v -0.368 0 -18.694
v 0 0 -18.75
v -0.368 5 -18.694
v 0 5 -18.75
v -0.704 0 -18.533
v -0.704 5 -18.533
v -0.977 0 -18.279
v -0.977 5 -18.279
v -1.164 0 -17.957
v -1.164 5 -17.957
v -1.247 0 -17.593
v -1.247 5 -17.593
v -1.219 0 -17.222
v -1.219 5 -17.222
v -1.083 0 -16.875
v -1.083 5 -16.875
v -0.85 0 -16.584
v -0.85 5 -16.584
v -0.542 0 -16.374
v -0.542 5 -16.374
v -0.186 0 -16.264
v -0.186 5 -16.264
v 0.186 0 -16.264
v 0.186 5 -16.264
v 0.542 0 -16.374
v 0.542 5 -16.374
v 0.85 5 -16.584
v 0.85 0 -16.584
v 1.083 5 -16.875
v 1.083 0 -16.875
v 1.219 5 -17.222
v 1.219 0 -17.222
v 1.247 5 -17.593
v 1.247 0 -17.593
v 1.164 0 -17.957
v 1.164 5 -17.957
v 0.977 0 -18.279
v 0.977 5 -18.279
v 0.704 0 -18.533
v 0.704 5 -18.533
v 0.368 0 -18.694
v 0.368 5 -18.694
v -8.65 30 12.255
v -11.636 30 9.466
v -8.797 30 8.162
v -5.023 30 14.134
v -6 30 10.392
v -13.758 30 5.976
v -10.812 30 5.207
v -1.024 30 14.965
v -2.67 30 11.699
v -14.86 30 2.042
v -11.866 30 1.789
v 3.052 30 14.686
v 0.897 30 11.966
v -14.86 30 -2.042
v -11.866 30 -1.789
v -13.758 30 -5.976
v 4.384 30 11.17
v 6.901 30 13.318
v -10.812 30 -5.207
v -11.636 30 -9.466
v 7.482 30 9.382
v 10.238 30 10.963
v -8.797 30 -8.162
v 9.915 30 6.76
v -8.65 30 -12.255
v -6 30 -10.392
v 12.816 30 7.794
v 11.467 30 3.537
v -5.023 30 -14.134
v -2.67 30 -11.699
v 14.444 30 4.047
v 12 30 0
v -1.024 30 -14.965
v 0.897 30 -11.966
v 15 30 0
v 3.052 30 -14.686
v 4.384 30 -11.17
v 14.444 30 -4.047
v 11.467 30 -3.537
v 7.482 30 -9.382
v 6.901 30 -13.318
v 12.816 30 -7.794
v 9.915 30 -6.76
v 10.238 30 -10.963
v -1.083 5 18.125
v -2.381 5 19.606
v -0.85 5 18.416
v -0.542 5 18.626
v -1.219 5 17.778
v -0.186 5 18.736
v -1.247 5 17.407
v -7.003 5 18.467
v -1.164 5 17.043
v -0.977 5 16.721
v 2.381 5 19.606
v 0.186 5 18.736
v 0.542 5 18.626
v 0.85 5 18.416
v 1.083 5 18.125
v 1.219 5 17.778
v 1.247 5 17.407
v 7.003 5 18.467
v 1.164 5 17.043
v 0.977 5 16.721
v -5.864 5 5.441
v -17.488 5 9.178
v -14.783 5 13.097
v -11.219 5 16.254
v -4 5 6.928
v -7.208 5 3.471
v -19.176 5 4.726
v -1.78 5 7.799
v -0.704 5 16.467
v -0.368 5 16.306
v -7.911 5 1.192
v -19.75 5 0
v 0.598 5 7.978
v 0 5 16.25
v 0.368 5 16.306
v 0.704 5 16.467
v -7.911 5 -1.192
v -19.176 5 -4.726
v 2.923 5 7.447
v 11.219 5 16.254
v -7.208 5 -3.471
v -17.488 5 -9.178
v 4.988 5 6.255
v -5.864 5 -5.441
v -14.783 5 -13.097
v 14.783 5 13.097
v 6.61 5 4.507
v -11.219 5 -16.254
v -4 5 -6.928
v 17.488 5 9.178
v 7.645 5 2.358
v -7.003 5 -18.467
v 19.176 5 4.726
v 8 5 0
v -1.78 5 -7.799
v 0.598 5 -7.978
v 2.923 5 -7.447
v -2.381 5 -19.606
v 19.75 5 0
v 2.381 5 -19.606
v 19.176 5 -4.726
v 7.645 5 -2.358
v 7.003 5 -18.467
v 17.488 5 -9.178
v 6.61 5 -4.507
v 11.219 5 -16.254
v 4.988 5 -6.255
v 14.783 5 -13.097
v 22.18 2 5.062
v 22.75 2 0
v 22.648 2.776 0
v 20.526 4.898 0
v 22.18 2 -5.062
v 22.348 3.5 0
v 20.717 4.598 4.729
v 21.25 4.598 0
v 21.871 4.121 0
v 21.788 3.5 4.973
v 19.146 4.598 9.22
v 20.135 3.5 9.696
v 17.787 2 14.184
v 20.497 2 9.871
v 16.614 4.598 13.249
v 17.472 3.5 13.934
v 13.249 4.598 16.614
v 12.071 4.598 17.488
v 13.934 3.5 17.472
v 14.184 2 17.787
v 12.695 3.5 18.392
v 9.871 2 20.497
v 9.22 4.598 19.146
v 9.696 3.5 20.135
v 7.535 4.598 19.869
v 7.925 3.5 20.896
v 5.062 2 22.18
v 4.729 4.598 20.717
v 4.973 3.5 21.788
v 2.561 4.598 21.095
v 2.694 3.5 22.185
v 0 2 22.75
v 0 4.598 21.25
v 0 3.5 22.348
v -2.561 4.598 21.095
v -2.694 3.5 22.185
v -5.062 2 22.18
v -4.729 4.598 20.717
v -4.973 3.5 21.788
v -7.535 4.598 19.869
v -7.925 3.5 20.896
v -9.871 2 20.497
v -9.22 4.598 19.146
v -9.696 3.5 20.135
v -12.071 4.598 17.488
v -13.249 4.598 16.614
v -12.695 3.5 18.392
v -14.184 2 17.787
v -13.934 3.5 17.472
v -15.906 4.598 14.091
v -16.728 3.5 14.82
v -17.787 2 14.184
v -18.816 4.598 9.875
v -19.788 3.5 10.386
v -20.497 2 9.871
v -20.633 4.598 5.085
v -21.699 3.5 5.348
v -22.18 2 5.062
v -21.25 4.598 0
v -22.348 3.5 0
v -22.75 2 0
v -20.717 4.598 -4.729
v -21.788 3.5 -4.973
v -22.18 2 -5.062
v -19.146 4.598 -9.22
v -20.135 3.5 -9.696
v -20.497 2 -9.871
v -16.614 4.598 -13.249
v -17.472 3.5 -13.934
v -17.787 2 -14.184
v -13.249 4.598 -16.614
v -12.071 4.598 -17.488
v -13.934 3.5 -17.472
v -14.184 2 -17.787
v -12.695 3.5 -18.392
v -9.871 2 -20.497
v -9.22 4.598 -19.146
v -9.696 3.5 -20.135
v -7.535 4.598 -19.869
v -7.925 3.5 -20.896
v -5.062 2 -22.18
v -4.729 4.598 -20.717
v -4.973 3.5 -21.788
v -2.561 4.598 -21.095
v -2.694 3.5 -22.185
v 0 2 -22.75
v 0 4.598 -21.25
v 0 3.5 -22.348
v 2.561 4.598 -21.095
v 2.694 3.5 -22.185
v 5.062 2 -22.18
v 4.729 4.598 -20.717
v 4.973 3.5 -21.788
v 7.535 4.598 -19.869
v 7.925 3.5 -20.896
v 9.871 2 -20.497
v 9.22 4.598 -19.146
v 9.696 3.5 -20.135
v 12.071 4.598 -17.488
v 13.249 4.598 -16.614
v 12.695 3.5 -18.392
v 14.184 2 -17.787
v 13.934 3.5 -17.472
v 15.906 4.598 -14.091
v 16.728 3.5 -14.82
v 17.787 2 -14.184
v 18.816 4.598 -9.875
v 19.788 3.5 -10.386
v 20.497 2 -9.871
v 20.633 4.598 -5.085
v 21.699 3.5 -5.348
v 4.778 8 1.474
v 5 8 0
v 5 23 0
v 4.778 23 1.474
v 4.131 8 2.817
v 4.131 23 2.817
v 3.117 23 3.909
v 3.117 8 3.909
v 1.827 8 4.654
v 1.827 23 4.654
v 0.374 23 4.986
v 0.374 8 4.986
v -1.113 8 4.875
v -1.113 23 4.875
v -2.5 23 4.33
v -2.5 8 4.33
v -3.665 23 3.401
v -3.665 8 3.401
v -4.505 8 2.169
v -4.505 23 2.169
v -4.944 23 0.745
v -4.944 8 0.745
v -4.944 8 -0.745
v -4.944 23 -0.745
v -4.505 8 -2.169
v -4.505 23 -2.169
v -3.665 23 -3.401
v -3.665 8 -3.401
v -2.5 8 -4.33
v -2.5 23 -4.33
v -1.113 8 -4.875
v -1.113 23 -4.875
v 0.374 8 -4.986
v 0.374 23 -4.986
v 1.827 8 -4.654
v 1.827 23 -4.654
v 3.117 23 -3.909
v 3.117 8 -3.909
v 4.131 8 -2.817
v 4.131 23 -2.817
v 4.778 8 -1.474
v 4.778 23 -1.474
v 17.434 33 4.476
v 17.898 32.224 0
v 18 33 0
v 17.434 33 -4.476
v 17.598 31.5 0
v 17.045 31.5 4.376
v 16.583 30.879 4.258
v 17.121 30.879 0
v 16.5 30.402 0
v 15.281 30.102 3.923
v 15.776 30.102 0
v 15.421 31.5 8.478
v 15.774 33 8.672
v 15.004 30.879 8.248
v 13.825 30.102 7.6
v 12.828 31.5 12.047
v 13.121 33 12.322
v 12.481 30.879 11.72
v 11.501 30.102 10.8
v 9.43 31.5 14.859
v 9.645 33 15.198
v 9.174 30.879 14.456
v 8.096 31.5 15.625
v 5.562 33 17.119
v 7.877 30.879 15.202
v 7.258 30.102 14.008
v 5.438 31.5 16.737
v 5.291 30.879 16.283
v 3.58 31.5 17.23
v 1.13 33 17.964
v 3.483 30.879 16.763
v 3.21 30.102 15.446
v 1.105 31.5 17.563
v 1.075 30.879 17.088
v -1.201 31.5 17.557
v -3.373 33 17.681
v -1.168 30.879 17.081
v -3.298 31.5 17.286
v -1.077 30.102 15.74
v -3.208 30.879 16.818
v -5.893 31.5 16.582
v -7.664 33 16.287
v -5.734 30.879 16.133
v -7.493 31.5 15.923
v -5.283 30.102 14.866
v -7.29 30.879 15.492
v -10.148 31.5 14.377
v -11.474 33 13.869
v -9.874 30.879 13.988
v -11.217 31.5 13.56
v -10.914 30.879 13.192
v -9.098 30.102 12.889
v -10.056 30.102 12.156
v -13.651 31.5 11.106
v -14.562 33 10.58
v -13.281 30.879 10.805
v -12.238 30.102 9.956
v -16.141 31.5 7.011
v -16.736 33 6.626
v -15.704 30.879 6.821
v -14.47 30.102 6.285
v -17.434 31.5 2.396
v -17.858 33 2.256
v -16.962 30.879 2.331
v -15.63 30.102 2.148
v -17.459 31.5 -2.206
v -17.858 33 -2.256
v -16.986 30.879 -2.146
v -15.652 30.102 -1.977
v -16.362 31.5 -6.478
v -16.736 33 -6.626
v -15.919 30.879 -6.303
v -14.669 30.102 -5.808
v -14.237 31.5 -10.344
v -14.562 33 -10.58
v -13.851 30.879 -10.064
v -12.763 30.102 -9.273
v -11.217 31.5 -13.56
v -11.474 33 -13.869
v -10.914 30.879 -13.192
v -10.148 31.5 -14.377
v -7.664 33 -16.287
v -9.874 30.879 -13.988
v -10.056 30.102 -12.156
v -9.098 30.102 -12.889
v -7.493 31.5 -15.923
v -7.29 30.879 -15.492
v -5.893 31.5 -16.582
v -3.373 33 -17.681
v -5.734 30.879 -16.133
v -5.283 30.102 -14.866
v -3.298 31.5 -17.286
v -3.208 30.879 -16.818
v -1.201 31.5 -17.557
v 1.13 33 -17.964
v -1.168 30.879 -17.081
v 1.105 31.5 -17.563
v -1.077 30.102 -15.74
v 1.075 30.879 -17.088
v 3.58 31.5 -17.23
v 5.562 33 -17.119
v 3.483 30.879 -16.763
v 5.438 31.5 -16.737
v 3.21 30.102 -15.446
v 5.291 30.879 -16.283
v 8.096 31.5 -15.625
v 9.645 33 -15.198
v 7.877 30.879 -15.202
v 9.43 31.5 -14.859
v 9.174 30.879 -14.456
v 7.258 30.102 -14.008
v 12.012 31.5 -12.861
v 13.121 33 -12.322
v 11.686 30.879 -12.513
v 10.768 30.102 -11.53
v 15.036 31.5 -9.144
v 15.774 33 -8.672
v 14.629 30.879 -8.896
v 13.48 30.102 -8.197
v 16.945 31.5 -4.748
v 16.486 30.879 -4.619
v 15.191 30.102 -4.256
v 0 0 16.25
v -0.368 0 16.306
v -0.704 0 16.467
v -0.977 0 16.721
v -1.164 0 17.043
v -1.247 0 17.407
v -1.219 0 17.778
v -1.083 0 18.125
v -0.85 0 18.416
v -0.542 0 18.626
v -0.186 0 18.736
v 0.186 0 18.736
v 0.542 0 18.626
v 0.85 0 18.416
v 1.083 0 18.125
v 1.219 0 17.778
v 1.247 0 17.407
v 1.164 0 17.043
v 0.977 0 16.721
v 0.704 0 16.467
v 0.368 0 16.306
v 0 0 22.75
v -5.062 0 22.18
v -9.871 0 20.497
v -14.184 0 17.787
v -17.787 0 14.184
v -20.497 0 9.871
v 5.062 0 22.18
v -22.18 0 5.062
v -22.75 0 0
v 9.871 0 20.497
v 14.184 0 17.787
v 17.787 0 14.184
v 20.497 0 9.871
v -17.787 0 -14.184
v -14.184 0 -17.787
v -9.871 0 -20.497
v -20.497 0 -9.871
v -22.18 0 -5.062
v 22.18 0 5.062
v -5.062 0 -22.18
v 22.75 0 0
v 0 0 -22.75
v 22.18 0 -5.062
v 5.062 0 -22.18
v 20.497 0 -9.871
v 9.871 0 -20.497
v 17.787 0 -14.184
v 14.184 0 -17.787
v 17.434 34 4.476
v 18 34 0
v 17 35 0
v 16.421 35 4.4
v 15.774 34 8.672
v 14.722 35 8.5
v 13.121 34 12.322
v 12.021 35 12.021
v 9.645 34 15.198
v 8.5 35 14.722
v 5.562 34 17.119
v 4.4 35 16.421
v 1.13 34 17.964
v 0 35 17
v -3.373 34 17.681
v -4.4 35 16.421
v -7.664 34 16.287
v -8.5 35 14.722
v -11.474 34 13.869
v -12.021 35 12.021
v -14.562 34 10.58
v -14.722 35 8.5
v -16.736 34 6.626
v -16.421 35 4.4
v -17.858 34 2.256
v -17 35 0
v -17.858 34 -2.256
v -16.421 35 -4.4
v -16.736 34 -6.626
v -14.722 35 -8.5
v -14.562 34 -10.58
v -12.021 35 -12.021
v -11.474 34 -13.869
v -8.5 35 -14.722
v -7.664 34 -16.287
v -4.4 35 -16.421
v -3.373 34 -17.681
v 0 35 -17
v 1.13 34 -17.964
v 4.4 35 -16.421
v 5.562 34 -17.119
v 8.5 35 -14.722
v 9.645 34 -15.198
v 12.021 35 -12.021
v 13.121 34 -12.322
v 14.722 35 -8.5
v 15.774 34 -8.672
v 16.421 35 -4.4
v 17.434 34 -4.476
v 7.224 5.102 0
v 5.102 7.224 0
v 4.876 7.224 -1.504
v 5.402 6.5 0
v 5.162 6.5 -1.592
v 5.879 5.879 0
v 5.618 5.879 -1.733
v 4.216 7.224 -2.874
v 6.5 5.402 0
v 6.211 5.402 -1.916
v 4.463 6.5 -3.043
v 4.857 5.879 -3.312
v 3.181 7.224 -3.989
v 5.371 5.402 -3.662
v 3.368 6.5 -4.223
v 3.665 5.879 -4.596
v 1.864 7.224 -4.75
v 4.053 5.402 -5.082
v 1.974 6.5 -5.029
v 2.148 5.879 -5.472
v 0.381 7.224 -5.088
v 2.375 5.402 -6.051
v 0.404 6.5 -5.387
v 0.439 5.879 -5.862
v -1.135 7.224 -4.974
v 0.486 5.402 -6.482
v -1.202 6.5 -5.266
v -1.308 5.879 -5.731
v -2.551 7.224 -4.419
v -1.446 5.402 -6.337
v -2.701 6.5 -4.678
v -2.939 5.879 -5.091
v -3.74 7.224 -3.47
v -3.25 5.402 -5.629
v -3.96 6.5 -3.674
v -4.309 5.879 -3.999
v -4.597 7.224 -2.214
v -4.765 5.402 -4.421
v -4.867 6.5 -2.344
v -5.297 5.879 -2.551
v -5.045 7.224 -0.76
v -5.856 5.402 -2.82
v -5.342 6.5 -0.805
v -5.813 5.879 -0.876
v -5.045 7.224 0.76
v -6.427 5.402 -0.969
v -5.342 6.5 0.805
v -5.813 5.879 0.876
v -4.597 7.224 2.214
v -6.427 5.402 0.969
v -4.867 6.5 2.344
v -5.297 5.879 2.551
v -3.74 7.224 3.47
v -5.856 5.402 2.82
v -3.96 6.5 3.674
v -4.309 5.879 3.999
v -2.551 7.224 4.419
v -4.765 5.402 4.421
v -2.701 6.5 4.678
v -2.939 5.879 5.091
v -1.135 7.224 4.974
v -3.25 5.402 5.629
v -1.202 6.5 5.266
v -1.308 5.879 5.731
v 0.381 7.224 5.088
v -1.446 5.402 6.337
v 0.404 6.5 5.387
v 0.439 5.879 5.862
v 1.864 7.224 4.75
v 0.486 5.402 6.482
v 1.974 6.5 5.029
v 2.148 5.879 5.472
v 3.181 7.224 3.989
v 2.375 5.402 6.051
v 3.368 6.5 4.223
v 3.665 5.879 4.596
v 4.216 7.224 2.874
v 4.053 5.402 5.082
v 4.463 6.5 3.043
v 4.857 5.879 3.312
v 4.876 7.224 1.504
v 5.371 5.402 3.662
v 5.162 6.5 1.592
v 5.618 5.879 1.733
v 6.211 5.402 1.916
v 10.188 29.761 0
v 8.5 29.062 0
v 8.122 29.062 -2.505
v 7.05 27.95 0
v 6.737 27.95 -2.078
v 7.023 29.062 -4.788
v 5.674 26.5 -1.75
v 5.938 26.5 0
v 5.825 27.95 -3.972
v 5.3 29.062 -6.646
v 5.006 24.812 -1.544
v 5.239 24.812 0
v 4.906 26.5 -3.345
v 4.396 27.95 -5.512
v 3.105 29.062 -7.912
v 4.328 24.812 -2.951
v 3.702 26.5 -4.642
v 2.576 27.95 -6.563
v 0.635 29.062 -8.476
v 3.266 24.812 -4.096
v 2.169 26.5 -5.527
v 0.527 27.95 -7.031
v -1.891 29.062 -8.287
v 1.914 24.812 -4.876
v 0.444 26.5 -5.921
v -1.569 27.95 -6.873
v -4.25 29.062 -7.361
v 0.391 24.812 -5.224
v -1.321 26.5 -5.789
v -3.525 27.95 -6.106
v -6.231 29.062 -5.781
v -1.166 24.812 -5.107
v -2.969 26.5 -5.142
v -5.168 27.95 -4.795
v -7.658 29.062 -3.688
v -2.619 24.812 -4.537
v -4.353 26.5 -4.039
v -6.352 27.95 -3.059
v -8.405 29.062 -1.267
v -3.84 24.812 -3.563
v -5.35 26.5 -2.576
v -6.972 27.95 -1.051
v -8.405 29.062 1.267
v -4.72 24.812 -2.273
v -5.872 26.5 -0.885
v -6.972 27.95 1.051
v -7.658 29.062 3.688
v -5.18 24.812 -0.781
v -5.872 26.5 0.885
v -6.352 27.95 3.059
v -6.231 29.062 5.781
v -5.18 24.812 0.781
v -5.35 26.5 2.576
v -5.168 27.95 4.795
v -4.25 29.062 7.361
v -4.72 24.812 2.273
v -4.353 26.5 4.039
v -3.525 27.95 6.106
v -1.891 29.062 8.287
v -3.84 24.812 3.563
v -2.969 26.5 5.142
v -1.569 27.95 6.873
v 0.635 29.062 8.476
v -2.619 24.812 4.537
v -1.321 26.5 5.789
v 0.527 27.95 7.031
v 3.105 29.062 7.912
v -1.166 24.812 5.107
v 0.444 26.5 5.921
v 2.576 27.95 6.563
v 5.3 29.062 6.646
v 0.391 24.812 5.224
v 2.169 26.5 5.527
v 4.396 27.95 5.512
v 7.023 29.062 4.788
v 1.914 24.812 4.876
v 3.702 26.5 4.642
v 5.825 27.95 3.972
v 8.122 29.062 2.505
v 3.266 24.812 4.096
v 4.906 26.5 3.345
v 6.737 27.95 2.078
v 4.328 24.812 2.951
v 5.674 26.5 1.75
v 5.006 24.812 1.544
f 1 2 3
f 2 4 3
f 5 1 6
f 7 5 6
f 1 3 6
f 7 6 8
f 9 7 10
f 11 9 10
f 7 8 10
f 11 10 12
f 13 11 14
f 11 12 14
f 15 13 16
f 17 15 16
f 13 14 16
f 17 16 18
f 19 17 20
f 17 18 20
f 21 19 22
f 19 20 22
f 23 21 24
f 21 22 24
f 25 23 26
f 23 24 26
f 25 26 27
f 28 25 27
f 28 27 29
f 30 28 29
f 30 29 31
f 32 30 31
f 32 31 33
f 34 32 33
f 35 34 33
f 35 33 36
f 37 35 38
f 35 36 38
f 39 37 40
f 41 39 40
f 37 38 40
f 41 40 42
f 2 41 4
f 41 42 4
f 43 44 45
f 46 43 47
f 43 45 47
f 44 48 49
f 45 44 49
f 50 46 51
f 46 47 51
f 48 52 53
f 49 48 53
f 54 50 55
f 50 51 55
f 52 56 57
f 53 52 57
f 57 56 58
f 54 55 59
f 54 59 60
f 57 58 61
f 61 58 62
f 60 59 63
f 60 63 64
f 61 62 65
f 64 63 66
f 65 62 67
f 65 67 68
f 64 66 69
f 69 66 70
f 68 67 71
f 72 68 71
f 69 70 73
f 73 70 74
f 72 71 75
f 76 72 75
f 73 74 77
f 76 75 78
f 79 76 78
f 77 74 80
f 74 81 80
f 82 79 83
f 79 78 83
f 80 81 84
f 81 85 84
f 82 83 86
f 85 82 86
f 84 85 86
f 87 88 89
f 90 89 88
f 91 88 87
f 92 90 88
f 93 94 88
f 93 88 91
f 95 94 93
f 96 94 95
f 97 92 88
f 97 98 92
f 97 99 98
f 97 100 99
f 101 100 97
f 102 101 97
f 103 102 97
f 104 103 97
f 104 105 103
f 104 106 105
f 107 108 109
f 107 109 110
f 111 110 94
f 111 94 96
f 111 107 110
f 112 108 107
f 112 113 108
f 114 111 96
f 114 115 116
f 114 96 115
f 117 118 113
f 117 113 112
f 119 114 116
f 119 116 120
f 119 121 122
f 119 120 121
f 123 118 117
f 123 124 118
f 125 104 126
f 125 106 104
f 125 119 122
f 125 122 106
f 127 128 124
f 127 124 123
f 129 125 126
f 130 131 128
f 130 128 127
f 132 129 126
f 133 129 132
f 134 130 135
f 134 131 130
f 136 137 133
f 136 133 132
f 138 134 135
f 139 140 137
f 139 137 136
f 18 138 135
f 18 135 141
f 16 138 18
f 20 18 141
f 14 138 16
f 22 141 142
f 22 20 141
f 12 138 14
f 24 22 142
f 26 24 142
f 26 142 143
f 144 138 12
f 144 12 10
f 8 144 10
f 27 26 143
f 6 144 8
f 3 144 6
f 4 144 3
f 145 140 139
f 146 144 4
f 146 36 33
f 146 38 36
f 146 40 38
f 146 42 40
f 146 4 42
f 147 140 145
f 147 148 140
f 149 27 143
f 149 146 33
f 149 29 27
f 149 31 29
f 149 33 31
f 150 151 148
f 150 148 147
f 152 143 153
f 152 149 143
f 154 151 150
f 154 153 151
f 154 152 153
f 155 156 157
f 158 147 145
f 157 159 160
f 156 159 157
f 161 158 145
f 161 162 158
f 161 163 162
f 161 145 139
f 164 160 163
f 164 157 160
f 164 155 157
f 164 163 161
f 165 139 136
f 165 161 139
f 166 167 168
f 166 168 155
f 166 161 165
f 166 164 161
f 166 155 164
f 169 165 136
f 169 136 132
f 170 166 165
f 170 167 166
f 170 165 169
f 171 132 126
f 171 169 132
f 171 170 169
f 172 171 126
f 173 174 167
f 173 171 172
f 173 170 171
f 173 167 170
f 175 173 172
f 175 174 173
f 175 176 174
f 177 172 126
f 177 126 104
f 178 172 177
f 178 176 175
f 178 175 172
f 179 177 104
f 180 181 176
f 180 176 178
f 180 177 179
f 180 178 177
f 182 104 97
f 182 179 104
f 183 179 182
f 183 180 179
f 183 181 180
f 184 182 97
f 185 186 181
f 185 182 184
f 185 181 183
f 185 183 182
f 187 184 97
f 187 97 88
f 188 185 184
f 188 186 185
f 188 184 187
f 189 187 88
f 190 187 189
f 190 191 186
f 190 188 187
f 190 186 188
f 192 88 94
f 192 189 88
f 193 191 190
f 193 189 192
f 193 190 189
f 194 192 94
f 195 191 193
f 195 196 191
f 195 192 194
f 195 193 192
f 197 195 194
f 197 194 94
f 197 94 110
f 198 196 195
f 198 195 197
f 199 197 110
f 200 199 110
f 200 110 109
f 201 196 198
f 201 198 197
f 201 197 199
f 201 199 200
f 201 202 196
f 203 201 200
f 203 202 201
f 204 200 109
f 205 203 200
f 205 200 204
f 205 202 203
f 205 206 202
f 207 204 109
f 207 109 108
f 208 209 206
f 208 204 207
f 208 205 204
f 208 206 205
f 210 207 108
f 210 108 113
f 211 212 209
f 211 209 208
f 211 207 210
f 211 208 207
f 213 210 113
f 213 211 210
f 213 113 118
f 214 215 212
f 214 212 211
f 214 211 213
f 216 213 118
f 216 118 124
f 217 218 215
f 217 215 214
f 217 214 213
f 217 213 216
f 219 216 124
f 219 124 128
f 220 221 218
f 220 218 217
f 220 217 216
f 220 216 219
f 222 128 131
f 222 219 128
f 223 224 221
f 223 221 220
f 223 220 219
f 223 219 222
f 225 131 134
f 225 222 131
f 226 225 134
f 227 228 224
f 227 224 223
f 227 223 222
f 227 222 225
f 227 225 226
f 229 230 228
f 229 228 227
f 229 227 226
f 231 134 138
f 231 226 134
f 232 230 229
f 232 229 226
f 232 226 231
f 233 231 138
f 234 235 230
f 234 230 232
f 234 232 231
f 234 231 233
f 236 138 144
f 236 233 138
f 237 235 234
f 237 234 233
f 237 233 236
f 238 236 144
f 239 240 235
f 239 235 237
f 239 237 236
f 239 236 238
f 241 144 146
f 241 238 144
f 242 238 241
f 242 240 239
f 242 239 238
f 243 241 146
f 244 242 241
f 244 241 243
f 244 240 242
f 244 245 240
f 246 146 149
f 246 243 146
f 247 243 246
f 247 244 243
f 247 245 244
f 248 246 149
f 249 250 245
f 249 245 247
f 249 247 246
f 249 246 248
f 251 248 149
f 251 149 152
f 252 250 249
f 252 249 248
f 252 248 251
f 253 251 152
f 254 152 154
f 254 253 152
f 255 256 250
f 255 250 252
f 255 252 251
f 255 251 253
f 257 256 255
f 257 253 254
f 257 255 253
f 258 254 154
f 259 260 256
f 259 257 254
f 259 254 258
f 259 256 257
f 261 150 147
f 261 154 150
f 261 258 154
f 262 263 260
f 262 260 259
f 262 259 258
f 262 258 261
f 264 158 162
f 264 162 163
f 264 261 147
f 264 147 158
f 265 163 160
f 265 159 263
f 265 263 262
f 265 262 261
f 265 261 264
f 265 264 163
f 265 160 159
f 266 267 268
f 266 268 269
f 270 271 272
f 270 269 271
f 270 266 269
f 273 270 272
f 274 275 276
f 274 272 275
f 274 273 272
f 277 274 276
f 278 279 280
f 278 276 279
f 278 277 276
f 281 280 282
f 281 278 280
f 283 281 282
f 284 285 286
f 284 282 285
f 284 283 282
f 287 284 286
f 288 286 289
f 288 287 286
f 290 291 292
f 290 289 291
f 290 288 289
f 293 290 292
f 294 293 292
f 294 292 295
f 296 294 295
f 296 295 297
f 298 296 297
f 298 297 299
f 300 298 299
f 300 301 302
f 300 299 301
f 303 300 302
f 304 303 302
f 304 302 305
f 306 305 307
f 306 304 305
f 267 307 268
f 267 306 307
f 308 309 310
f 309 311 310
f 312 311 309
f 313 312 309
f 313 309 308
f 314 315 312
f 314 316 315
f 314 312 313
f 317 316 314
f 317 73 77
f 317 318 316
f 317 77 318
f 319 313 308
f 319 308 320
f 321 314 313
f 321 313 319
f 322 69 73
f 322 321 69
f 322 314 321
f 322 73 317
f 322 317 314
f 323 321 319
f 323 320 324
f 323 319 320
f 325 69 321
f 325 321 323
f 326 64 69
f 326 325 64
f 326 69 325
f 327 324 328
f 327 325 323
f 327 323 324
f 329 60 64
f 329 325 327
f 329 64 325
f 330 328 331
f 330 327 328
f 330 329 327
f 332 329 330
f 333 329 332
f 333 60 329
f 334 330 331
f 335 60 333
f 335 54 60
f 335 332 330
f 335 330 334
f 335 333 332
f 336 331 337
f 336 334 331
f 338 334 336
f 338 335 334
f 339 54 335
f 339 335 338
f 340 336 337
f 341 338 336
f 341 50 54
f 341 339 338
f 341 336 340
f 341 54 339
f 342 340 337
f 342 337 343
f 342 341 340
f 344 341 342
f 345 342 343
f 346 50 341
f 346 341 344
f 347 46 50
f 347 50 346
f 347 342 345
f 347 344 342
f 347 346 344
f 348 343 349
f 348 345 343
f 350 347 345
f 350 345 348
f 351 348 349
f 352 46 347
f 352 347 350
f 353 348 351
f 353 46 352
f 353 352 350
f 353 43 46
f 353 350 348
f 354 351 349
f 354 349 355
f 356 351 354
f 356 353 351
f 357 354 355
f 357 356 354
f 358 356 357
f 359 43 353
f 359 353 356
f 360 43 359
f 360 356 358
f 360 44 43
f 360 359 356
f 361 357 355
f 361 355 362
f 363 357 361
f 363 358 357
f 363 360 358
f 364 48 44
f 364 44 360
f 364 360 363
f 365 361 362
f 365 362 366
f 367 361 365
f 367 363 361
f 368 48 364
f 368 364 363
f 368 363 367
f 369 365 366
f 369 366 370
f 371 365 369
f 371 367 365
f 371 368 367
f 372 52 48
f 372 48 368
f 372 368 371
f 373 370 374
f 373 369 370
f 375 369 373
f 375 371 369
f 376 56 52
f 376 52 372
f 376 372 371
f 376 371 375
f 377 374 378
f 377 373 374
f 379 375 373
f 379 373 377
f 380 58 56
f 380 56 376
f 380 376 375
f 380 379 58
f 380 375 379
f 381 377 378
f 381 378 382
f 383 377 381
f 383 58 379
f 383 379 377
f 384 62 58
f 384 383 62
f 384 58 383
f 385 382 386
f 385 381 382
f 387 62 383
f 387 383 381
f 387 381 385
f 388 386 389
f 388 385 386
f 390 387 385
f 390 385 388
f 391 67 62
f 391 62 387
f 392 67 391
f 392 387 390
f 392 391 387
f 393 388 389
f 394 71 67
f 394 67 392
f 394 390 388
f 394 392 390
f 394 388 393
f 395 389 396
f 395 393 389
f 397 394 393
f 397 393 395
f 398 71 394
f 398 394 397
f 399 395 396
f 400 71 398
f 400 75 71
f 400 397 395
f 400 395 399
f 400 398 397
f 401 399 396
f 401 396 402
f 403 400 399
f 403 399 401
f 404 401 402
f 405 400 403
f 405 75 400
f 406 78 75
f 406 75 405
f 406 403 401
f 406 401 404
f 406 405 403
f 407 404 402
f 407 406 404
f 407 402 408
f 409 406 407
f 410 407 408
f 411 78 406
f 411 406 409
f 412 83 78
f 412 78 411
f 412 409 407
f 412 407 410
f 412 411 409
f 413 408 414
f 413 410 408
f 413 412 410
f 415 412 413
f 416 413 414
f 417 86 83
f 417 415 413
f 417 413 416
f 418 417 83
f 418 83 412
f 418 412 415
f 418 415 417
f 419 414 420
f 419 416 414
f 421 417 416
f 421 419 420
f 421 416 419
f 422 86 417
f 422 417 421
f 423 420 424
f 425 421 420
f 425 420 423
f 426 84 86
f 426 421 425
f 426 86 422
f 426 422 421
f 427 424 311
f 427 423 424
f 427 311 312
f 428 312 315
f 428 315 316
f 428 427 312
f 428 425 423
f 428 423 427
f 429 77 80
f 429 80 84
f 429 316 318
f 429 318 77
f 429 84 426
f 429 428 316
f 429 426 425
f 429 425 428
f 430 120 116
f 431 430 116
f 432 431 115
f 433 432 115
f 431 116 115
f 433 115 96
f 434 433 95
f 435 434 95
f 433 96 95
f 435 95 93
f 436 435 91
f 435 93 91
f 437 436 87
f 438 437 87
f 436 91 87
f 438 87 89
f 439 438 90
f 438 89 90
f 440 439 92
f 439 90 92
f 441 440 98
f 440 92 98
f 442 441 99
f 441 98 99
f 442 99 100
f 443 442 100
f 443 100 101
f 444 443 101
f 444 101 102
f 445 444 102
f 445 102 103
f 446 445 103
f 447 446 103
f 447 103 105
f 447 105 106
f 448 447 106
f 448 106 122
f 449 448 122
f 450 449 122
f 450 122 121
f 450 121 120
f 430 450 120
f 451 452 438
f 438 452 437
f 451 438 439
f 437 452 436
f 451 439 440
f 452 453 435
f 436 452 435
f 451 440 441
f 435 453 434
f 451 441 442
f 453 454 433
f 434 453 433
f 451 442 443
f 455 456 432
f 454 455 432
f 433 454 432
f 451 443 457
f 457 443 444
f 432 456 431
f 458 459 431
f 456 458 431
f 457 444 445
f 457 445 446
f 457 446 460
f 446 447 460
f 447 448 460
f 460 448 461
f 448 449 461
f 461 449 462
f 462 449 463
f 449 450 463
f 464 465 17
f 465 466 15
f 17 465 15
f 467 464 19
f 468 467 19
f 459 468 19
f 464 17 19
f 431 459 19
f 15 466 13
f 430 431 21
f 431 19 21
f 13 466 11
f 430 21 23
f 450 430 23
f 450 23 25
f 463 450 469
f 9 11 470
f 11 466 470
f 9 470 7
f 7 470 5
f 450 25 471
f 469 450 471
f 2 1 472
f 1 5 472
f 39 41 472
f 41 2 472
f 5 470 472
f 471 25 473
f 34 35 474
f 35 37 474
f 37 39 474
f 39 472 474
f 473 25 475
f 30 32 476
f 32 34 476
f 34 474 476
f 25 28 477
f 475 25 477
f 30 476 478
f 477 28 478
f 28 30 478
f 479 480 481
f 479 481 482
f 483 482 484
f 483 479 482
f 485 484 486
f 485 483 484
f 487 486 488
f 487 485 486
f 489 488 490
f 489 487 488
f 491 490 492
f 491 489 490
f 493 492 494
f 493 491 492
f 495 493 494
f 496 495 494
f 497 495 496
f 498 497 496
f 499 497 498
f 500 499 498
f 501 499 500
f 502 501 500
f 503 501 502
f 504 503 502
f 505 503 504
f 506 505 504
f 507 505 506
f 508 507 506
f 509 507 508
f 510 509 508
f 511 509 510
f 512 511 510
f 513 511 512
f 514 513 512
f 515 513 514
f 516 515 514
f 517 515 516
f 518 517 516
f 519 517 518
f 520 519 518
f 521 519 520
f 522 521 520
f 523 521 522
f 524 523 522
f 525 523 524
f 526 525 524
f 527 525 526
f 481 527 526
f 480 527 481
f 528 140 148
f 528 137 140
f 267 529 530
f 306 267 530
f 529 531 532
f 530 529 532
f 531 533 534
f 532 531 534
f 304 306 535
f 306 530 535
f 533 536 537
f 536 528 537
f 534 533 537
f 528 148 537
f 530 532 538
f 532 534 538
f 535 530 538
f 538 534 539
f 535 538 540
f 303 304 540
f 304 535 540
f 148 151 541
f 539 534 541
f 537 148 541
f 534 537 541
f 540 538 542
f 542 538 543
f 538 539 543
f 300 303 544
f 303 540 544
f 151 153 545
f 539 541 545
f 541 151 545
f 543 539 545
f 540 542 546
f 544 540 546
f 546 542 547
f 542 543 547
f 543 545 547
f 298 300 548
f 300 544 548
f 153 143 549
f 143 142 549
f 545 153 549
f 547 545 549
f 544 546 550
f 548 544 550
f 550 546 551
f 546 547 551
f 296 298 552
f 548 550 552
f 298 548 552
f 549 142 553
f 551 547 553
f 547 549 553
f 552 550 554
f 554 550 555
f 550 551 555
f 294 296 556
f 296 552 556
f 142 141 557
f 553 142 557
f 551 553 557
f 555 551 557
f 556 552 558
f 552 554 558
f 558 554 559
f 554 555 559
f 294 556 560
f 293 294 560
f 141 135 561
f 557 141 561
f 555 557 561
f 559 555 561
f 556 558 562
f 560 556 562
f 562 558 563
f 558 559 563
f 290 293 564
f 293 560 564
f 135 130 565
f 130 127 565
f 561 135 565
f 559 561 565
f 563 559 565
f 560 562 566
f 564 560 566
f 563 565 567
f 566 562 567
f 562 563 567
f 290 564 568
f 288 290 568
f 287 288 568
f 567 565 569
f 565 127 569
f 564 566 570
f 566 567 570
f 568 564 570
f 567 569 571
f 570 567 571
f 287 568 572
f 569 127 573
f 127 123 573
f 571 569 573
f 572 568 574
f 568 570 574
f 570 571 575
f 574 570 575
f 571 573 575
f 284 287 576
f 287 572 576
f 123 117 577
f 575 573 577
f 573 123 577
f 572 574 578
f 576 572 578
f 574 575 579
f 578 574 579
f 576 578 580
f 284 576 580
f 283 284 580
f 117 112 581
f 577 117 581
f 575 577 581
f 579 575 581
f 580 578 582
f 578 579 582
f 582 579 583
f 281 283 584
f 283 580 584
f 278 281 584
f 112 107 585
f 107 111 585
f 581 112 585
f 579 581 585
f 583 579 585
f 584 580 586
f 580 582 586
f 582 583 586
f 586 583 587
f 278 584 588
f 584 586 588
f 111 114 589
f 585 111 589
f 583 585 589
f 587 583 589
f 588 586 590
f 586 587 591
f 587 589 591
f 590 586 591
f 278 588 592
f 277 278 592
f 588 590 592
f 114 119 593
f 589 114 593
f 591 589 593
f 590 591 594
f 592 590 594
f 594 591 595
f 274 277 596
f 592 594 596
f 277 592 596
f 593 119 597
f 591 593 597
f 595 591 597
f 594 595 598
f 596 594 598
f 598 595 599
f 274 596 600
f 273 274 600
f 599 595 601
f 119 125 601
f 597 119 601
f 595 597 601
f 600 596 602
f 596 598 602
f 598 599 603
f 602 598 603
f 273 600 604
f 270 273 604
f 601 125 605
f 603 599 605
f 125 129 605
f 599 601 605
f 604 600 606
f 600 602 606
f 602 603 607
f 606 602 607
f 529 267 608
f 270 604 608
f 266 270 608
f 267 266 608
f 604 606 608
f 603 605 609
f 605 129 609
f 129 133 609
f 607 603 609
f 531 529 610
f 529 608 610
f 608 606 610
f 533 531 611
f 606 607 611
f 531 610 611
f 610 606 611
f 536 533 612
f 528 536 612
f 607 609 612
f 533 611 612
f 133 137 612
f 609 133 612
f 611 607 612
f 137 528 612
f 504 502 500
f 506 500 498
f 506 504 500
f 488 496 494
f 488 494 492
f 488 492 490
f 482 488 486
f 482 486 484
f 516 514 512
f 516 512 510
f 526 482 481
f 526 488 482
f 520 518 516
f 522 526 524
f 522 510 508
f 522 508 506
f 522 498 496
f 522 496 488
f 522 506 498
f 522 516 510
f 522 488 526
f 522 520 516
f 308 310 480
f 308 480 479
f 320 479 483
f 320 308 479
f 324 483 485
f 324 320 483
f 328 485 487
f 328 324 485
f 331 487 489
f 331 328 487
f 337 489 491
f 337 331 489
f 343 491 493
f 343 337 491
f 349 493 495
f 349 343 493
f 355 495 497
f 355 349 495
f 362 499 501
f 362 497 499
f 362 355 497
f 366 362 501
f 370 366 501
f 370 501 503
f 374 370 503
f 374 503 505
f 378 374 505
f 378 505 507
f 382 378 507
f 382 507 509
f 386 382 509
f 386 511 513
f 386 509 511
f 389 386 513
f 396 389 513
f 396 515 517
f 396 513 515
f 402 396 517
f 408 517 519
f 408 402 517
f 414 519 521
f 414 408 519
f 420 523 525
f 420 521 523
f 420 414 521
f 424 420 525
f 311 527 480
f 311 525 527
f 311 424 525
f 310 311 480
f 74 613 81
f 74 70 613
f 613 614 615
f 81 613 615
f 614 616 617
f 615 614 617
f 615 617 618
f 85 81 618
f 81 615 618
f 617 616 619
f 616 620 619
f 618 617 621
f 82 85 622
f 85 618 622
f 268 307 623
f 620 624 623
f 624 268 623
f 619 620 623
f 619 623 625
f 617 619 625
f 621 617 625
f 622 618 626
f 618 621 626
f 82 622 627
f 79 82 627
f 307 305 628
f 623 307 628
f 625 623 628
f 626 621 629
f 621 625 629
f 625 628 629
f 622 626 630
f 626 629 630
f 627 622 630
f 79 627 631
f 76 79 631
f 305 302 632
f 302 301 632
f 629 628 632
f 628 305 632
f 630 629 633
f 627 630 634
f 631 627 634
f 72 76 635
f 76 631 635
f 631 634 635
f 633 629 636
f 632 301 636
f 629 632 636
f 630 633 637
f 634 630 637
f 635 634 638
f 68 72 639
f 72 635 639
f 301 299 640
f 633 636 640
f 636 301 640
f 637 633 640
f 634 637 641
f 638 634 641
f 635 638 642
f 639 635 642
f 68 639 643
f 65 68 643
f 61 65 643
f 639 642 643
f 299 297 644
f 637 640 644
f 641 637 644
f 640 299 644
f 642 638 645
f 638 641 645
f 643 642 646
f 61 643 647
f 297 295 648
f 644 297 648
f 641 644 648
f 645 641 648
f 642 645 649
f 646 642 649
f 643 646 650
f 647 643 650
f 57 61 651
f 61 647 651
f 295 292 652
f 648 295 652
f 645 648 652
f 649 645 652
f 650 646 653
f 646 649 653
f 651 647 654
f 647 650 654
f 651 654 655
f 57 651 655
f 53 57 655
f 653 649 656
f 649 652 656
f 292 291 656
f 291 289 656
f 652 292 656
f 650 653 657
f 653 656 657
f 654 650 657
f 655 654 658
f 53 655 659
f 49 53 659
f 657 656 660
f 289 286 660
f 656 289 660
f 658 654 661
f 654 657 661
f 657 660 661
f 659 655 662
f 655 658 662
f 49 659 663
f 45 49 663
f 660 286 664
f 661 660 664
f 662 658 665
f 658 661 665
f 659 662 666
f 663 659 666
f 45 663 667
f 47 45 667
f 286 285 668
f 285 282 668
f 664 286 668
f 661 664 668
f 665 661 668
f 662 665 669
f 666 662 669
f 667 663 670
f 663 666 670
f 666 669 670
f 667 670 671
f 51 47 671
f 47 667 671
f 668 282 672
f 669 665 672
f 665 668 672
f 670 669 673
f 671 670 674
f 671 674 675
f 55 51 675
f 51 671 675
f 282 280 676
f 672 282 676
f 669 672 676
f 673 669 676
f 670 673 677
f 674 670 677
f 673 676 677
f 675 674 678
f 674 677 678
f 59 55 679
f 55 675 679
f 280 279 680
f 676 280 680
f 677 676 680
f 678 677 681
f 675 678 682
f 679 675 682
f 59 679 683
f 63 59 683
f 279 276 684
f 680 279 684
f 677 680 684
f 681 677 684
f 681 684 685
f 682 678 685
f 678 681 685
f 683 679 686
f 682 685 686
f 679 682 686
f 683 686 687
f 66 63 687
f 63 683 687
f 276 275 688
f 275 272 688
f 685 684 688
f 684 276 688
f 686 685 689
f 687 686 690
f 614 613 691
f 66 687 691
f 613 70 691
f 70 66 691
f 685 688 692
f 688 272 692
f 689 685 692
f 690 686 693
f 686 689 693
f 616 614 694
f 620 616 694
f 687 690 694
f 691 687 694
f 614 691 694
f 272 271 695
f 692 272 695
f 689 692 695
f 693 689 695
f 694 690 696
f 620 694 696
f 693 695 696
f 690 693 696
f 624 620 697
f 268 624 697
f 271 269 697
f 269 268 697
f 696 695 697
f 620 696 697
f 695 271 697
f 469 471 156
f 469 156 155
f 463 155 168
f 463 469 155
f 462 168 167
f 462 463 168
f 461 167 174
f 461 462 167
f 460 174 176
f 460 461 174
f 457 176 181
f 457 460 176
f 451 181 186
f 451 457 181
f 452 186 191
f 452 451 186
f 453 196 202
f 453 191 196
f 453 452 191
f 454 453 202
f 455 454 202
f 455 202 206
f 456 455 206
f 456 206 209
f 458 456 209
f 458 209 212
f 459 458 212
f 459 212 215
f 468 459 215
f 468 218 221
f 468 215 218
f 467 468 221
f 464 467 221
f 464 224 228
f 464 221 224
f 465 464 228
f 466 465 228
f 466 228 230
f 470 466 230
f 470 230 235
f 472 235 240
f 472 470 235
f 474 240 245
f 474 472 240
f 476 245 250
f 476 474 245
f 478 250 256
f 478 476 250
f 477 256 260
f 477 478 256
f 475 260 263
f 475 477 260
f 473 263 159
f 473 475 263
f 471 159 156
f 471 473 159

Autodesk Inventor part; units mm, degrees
ref_plane "YZ Plane" through (0, 0, 0) normal (1, 0, 0) x (0, 1, 0)
ref_plane "XZ Plane" through (0, 0, 0) normal (0, 1, 0) x (-1, 0, 0)
ref_plane "XY Plane" through (0, 0, 0) normal (0, 0, 1) x (1, 0, 0)
sketch "Sketch2" plane through (0, 0, 0) normal (0, 0, 1) x (1, 0, 0)
  line L0 (0, 0) -> (22.75, 0)
  line L1 (0, 0) -> (0, 35)
  line L2 (0, 35) -> (18, 35)
  line L3 (18, 35) -> (18, 30)
  line L4 (18, 30) -> (5, 30)
  line L5 (5, 30) -> (5, 5)
  line L6 (5, 5) -> (22.75, 5)
  line L7 (22.75, 5) -> (22.75, 0)
  dimension "d3" = 22.75
  dimension "d4" = 35
  dimension "d5" = 18
  dimension "d6" = 5
  dimension "d23" = 5
  dimension "d24" = 25
  dimension "d26" = 5
revolve "Revolution1" add sketch "Sketch2" angle 360 about axis through (0, 0, 0) along (0, 1, 0)
fillet "Fillet1" radius 3 3 edges at (-5, 5, 0) (-18, 30, 0) (-22.75, 5, 0)
chamfer "Chamfer1" distance 1 angle 45 1 edges at (-18, 35, 0)
sketch "Sketch3" plane through (0, 0, 0) normal (0, -1, 0) x (1, 0, 0)
  line L0 (0, 0) -> (0, -17.5)
  line L1 (0, 0) -> (0, 17.5)
  dimension "d14" = 17.5
  dimension "d15" = 17.5
hole "Hole1" at (0, 0, 17.5) at (0, 0, -17.5) direction (0, 1, 0) diameter 2.5 depth 5
fillet "Fillet2" radius 7 1 edges at (-5, 30, 0)
properties part number "holding_socket"
